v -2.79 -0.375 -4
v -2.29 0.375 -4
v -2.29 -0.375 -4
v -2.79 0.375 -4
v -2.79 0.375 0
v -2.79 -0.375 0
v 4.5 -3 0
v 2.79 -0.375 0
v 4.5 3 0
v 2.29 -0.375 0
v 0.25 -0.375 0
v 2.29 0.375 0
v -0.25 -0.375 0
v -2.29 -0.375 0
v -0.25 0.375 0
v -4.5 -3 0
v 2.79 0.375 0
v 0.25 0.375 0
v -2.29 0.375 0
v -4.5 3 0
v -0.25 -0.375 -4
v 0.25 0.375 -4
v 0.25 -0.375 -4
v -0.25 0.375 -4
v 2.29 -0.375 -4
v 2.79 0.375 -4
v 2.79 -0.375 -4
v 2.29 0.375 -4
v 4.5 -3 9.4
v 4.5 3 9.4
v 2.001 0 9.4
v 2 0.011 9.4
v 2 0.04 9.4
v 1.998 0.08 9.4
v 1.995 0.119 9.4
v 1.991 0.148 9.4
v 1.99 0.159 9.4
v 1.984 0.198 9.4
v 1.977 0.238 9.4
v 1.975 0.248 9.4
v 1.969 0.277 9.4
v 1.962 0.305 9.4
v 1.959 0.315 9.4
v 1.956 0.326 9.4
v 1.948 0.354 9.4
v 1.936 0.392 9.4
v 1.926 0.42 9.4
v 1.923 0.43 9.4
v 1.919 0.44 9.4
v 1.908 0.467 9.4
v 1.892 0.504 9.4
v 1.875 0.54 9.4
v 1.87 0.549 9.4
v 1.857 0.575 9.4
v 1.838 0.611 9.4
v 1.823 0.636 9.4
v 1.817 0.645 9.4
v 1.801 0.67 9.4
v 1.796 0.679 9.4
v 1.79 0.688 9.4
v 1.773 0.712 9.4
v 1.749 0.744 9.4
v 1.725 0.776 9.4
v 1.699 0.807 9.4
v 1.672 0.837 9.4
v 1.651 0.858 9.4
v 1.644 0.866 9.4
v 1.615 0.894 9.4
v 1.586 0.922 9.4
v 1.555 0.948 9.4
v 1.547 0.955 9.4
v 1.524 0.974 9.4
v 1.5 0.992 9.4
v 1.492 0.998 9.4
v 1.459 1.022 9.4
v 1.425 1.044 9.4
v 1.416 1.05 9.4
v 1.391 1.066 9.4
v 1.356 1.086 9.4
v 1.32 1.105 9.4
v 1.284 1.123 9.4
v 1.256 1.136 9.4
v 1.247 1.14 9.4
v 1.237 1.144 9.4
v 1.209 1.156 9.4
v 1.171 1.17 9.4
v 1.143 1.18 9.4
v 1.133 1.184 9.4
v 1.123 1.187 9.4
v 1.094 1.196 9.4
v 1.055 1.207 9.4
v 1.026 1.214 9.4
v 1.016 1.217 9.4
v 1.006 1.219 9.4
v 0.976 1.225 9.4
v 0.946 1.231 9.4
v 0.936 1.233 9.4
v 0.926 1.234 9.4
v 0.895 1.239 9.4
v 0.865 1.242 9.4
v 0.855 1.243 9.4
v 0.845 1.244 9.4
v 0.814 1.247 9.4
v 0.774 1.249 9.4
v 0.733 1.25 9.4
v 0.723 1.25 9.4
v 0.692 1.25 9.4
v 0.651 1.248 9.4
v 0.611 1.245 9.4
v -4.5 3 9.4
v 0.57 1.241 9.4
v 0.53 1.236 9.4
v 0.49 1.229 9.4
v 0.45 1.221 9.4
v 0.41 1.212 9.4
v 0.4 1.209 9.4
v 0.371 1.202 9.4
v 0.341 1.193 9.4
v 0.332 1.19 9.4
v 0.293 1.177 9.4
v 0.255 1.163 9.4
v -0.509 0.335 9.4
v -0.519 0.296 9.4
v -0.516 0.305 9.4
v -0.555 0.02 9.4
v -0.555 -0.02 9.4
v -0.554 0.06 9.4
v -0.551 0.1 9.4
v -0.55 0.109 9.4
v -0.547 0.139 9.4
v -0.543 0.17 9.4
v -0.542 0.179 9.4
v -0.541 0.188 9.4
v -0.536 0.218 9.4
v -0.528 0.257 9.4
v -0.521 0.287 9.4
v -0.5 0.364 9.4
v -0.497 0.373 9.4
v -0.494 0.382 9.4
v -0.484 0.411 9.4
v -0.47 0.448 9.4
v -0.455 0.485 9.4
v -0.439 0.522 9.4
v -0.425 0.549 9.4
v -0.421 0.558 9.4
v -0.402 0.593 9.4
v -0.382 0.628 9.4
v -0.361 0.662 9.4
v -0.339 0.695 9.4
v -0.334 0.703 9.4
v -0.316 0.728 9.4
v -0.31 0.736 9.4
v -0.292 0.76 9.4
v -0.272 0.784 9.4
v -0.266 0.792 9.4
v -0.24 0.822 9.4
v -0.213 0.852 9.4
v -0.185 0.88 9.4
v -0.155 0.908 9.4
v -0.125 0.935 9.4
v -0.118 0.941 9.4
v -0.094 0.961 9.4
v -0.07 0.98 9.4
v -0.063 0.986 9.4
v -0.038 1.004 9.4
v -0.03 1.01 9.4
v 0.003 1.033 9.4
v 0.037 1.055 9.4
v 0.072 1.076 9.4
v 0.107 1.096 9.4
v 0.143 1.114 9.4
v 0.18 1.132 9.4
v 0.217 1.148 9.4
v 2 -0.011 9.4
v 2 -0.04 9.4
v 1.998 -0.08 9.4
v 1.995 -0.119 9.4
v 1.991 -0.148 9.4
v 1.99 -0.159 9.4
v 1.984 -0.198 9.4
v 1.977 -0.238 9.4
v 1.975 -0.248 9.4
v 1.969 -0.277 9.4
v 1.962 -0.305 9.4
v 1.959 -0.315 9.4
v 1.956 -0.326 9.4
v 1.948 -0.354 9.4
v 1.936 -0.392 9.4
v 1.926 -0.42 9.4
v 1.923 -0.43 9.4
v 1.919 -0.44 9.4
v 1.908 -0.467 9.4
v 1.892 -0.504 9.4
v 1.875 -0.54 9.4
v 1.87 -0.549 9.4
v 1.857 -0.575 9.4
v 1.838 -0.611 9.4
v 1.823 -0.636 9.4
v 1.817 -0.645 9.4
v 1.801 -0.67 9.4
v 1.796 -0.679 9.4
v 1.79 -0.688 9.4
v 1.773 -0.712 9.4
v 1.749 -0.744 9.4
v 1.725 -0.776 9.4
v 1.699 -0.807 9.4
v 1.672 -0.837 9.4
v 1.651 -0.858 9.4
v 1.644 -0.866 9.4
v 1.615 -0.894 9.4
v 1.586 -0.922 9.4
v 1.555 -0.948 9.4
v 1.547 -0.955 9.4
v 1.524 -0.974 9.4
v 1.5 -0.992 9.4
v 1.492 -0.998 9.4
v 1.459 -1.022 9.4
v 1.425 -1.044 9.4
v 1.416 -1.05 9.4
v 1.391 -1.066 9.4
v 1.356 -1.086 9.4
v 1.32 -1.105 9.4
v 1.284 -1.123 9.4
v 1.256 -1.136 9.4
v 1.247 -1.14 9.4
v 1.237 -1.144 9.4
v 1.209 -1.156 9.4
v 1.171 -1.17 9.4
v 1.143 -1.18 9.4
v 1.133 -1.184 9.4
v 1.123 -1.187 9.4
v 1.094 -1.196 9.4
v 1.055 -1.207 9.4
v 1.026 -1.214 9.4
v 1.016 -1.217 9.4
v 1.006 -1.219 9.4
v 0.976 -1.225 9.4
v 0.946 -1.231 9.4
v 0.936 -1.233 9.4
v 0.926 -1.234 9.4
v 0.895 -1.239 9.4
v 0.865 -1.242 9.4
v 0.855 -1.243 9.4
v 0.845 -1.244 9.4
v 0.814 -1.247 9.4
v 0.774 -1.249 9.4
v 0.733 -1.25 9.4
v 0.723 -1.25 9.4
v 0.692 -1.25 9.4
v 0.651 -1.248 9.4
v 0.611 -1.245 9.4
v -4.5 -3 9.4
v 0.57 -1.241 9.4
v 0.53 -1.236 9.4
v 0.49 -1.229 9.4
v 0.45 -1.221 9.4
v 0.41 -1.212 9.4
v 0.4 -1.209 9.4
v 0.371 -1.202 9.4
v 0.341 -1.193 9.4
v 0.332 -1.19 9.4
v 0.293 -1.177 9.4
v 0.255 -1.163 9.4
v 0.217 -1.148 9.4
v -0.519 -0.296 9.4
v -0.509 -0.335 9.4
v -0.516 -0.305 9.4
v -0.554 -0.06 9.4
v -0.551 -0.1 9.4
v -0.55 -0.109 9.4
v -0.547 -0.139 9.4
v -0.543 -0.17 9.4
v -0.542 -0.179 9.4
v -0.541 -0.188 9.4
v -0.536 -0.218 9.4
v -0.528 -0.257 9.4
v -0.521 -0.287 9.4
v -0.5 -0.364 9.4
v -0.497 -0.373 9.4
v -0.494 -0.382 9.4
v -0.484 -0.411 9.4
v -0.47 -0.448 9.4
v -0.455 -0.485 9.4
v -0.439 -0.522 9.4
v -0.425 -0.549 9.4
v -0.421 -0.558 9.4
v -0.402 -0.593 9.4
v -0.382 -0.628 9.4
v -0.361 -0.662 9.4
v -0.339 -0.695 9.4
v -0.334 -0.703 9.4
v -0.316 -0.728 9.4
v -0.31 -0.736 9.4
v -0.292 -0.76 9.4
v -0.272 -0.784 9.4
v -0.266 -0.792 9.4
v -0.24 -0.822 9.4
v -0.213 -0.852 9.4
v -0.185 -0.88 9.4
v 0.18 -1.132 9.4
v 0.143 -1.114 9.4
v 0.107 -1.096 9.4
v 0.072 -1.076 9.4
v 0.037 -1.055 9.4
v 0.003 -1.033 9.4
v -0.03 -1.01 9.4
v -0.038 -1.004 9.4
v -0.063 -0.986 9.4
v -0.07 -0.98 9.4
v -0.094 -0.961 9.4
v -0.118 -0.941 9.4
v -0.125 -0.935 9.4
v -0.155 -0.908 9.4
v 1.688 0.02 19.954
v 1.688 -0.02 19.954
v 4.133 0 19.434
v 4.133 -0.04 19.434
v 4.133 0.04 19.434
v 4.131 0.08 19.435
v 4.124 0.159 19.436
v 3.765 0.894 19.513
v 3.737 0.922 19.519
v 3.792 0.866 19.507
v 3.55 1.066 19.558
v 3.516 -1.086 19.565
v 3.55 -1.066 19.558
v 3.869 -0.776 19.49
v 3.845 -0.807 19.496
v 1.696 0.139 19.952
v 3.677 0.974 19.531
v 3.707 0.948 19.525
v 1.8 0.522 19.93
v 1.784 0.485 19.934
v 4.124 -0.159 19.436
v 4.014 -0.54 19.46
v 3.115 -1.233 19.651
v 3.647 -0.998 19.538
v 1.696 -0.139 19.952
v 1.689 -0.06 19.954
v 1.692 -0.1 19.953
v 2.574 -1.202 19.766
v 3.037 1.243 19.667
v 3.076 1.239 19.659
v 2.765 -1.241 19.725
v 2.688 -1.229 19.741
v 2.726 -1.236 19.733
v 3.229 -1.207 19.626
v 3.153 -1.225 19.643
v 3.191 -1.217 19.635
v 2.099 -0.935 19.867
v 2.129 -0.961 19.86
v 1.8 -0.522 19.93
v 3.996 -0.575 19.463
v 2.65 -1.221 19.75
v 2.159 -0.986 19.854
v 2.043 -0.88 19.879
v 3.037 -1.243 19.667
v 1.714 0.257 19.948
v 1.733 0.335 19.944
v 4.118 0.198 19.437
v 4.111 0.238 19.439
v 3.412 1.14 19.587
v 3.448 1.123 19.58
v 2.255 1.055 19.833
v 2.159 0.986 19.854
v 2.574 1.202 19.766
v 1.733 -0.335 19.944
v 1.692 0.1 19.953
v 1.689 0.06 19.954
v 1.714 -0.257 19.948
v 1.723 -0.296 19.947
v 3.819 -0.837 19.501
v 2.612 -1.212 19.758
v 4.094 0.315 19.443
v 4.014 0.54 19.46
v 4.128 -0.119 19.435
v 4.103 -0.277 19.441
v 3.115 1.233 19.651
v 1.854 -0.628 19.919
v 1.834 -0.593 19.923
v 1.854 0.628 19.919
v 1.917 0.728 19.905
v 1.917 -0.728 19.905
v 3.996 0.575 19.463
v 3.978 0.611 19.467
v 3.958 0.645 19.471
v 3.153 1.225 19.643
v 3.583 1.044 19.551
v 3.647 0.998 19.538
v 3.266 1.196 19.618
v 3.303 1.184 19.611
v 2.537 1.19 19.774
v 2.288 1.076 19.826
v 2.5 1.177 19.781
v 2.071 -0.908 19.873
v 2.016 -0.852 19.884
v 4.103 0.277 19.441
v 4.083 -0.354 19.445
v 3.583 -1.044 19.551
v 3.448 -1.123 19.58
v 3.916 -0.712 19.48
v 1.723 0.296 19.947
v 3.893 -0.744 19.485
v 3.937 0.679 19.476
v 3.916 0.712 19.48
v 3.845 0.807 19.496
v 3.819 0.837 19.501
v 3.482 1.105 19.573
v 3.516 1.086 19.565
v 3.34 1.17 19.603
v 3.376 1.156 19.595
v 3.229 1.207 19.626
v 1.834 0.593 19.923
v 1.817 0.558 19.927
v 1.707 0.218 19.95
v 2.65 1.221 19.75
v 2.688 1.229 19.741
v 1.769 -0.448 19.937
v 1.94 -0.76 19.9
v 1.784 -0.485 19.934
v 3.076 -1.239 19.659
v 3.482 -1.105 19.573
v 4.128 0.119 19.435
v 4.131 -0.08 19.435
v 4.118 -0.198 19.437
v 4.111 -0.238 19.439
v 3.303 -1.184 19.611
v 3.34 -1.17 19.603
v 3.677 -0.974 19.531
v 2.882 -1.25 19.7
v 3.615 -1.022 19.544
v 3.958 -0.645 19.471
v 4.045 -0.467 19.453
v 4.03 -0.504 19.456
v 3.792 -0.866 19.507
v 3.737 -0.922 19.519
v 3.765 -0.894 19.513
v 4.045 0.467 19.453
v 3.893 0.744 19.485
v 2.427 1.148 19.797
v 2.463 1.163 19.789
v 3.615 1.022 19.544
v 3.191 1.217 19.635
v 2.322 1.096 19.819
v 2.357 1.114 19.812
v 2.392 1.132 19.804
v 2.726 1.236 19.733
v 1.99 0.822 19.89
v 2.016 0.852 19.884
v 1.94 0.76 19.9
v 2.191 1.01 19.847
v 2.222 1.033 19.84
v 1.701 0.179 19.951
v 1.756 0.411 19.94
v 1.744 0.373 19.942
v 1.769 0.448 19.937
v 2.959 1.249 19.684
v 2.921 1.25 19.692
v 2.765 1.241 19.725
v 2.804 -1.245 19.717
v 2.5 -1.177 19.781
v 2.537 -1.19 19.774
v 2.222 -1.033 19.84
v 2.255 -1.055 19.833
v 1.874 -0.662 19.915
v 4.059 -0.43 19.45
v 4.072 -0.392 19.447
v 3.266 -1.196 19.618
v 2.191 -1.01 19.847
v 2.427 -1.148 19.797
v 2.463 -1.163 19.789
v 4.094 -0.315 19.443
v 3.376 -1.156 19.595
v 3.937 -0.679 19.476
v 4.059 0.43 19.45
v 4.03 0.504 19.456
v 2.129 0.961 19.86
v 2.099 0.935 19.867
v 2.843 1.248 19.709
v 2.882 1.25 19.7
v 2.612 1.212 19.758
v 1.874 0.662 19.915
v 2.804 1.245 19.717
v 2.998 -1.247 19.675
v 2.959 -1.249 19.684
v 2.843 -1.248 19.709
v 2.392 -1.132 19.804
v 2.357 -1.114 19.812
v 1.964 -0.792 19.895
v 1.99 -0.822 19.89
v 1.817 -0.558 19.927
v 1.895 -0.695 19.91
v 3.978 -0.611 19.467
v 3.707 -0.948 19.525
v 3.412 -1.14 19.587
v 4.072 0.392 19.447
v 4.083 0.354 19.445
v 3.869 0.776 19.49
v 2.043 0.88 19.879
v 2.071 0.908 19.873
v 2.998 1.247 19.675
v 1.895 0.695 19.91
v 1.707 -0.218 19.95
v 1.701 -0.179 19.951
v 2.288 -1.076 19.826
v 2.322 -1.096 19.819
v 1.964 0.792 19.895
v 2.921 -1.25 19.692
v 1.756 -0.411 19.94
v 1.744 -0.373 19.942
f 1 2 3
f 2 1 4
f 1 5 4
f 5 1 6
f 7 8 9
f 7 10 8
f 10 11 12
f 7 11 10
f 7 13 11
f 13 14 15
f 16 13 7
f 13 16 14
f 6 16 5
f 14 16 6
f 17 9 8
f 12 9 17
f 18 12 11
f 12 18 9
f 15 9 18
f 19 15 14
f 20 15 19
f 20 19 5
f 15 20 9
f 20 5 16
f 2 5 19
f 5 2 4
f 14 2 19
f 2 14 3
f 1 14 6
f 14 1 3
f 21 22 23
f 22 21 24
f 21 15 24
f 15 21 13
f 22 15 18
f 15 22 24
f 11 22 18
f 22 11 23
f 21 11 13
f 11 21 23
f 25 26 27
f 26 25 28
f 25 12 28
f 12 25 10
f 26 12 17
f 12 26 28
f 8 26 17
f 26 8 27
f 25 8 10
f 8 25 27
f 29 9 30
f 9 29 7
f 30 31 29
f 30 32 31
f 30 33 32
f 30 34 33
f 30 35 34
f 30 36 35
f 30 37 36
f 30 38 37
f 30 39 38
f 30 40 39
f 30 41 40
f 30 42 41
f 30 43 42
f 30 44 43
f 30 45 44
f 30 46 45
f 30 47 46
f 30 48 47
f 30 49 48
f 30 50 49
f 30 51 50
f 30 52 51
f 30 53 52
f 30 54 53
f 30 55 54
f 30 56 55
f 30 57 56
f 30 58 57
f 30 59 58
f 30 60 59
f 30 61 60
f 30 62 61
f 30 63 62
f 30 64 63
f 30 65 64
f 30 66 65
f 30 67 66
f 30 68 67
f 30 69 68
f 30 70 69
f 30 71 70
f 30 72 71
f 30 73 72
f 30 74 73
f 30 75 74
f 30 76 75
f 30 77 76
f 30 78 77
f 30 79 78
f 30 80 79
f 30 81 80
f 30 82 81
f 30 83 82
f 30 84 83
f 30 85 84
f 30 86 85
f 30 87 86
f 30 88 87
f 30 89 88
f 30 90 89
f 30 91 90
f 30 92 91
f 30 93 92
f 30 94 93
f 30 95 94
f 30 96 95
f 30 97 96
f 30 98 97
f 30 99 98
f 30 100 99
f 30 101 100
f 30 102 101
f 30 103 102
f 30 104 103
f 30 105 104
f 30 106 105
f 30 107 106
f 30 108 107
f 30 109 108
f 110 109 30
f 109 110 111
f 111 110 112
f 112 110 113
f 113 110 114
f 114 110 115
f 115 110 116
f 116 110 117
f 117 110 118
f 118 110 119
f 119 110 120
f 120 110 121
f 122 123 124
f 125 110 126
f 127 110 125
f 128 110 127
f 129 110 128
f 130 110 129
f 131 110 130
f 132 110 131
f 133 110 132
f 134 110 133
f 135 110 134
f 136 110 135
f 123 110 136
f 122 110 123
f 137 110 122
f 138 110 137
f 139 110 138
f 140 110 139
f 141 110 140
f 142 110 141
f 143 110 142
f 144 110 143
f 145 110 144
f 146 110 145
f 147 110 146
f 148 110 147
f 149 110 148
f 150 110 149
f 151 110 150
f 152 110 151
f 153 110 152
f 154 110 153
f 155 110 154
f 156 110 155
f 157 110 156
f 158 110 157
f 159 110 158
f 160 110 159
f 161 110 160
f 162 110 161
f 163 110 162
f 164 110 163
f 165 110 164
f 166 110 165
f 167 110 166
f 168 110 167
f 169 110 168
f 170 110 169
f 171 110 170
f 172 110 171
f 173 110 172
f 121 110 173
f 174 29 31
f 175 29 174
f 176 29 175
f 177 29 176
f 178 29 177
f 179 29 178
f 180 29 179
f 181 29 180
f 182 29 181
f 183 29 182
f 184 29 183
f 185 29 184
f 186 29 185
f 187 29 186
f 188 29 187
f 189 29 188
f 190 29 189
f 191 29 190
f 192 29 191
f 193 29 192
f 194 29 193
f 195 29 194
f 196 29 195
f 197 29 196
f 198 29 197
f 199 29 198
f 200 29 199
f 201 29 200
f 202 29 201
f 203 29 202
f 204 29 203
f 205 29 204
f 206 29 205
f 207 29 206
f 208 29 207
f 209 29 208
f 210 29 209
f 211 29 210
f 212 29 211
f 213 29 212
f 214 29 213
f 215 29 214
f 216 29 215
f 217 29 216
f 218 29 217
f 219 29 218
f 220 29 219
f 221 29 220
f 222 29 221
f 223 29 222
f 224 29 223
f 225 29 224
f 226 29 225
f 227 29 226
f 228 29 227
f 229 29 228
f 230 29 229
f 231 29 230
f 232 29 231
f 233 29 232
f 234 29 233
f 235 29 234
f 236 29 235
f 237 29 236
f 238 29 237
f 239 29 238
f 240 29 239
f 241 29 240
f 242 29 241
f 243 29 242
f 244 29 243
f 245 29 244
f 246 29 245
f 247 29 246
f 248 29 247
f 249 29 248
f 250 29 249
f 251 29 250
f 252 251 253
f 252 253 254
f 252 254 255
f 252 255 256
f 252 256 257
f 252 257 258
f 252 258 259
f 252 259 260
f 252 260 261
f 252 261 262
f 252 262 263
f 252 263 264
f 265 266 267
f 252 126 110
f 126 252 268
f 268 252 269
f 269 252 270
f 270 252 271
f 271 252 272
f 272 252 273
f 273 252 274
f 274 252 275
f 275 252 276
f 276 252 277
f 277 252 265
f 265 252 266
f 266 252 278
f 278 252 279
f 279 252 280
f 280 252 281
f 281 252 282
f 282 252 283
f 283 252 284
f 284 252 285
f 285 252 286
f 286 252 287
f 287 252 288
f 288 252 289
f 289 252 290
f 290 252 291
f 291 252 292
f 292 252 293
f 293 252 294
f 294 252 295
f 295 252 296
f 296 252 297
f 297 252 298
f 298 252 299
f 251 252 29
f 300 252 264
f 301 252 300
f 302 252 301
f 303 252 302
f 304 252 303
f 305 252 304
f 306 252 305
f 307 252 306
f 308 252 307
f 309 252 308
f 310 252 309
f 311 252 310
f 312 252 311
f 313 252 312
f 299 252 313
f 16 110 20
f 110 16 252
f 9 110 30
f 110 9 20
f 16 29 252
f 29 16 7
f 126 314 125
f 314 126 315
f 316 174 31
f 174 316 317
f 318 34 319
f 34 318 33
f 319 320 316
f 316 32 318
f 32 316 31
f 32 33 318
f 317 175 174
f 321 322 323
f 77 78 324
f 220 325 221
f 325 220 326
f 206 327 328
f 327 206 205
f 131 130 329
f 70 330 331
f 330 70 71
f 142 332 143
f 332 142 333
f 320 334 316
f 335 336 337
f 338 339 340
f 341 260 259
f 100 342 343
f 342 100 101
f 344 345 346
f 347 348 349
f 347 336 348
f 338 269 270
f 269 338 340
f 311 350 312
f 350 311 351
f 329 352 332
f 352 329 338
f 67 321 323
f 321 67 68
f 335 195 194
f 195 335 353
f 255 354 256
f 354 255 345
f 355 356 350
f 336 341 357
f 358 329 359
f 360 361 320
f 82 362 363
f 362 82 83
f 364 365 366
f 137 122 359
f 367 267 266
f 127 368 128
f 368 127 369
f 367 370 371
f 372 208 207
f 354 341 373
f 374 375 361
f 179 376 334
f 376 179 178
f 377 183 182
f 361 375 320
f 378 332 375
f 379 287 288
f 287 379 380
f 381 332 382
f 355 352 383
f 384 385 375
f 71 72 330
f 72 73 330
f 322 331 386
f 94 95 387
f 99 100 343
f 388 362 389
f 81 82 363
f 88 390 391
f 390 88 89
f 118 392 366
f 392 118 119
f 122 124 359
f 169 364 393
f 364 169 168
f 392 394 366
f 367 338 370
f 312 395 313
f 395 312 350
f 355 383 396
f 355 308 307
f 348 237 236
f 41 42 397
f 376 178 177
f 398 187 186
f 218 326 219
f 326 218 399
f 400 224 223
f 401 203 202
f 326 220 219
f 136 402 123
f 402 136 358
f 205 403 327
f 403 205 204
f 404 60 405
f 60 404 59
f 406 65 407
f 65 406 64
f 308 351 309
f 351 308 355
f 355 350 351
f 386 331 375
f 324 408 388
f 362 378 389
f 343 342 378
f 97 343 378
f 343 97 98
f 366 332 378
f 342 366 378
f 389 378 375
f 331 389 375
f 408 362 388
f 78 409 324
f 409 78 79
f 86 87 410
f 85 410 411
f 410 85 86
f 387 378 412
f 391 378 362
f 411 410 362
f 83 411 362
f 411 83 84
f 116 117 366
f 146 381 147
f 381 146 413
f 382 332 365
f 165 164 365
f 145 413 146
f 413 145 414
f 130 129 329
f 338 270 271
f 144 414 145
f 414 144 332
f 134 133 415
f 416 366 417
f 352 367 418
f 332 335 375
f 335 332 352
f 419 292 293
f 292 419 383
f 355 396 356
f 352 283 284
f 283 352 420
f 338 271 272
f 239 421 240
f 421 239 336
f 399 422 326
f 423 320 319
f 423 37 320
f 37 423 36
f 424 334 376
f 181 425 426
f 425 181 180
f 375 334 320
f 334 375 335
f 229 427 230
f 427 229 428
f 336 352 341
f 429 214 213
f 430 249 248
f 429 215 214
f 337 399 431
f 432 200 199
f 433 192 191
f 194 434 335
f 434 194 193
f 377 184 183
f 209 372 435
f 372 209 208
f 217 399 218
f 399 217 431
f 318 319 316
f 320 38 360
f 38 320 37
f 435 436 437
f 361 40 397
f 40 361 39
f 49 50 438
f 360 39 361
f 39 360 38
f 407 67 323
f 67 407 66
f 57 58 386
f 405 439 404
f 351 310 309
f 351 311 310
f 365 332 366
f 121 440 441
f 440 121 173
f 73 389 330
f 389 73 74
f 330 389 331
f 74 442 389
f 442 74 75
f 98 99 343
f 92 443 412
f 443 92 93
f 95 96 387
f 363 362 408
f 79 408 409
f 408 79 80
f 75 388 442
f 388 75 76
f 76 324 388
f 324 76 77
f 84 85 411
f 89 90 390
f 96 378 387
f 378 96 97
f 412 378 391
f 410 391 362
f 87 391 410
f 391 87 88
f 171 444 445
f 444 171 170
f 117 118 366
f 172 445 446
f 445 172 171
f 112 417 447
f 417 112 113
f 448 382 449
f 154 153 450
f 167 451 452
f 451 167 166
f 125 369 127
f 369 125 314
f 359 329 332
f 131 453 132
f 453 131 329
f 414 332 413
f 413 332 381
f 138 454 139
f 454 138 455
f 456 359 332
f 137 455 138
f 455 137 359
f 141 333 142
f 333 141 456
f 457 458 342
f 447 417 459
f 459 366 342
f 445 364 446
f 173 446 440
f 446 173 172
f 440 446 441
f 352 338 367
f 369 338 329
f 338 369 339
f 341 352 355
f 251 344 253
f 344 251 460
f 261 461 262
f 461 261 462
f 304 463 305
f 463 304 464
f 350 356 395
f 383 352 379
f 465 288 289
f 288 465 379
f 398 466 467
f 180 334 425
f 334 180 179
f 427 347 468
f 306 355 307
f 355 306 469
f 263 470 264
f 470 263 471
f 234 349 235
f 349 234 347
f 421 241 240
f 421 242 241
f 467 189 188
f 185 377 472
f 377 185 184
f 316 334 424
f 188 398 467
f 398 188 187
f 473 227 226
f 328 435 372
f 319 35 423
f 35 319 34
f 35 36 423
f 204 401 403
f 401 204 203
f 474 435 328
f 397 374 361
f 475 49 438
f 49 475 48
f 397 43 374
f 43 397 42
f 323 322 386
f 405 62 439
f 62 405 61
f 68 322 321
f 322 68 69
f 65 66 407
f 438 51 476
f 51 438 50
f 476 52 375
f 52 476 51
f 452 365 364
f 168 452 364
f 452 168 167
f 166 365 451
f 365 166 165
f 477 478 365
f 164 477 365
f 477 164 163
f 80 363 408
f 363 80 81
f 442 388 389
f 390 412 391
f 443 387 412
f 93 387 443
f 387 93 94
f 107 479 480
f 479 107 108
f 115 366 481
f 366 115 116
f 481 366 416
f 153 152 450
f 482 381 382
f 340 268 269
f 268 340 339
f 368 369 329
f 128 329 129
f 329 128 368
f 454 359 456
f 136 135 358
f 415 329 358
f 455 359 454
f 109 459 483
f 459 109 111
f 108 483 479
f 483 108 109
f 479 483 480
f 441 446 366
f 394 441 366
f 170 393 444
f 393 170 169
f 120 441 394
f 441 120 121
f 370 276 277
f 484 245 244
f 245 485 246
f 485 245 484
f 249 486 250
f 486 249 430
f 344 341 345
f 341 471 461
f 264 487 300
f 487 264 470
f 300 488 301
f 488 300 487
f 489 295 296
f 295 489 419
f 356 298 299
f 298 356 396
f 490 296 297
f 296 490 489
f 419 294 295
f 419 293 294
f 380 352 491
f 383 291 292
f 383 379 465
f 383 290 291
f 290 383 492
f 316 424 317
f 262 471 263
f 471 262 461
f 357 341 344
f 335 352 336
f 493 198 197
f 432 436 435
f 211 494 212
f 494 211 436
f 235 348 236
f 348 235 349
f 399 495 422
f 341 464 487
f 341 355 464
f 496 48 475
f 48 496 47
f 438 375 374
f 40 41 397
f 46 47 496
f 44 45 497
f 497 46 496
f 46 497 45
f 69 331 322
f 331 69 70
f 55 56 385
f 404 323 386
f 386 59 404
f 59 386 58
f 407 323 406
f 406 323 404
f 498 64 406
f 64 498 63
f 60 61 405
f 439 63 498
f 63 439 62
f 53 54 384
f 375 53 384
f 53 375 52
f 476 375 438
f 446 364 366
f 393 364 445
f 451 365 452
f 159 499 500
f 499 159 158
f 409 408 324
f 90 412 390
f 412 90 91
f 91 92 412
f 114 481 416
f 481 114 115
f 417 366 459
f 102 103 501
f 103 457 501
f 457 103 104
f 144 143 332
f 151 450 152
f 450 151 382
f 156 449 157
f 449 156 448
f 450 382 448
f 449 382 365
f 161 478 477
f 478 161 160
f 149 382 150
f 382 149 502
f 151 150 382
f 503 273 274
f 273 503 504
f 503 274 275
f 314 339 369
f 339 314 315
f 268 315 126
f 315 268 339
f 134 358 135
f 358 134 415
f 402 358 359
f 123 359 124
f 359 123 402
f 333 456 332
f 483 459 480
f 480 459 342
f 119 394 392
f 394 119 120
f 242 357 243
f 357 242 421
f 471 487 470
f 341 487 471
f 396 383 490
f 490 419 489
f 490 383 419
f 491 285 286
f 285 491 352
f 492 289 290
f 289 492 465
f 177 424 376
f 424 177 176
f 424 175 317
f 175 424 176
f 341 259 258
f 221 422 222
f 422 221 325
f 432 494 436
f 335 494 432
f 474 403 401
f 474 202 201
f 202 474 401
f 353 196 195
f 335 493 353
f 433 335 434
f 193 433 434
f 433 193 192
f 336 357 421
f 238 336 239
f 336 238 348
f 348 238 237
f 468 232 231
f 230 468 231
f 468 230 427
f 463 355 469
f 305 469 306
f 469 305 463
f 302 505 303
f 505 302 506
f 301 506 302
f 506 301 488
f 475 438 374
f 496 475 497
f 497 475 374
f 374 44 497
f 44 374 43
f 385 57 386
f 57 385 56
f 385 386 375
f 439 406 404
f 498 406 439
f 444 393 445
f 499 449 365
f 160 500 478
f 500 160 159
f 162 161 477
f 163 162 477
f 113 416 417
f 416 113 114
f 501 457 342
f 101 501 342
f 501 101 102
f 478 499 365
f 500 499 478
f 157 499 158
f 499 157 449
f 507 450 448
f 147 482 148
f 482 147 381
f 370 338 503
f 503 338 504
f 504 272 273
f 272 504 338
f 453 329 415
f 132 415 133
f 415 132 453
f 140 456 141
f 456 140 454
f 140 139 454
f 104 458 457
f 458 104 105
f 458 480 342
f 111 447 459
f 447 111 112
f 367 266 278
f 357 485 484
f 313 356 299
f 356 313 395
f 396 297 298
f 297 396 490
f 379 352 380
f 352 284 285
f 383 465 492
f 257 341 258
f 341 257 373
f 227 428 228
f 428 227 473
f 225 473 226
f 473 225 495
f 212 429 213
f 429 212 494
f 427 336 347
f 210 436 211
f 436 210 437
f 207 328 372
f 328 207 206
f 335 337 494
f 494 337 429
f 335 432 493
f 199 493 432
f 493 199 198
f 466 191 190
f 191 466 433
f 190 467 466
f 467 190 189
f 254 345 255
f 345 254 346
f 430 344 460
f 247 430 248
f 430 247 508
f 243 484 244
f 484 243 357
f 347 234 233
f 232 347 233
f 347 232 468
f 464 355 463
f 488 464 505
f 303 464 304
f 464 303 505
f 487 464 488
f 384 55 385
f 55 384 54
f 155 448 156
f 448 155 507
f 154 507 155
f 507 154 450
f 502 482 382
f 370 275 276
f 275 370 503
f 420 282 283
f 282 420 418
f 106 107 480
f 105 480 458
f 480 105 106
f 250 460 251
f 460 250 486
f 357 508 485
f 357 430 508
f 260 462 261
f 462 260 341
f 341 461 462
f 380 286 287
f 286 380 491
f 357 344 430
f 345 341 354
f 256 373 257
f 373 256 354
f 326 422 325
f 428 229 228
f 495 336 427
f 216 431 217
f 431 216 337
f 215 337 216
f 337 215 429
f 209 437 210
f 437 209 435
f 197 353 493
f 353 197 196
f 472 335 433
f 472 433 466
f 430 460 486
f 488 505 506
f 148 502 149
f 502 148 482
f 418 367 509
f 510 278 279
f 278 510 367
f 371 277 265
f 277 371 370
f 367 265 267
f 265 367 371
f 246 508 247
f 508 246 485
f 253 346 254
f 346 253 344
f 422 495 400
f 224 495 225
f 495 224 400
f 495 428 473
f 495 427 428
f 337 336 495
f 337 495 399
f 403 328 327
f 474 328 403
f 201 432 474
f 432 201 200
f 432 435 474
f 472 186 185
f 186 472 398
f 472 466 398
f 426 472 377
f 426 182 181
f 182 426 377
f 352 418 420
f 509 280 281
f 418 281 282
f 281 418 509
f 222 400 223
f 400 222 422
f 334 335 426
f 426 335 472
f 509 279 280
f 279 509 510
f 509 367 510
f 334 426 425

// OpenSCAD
$fa = 1;
$fs = 0.04;

body_color = [0.1,0.1,0.1];
body_width = 9;
body_depth = 6;
body_height = 9.4;

inter_pin_distance = 2.54;

pin_color = [0.9,0.9,0.9];
pin_width = 0.5;
pin_depth = 0.75;
pin_height = 4;

lever_color = [0.8,0.8,0.9];
lever_height = 14;
lever_offset_z = 6;
lever_radius = 1.25;
lever_angle = 12;

module pin() {
    color(pin_color)
        translate([-pin_width/2,-pin_depth/2,-pin_height])
        linear_extrude(height = pin_height)
            square([pin_width,pin_depth]);

}

color(body_color)
    translate([-body_width/2,-body_depth/2,0])
        cube([body_width,body_depth,body_height]);

color(lever_color)
    translate([0,0,lever_offset_z])
    rotate([0,lever_angle,0])
    linear_extrude(height = lever_height)
        circle(lever_radius);

for(i=[-1:1:1]) {
    translate([inter_pin_distance*i,0,0])
        pin();
}
